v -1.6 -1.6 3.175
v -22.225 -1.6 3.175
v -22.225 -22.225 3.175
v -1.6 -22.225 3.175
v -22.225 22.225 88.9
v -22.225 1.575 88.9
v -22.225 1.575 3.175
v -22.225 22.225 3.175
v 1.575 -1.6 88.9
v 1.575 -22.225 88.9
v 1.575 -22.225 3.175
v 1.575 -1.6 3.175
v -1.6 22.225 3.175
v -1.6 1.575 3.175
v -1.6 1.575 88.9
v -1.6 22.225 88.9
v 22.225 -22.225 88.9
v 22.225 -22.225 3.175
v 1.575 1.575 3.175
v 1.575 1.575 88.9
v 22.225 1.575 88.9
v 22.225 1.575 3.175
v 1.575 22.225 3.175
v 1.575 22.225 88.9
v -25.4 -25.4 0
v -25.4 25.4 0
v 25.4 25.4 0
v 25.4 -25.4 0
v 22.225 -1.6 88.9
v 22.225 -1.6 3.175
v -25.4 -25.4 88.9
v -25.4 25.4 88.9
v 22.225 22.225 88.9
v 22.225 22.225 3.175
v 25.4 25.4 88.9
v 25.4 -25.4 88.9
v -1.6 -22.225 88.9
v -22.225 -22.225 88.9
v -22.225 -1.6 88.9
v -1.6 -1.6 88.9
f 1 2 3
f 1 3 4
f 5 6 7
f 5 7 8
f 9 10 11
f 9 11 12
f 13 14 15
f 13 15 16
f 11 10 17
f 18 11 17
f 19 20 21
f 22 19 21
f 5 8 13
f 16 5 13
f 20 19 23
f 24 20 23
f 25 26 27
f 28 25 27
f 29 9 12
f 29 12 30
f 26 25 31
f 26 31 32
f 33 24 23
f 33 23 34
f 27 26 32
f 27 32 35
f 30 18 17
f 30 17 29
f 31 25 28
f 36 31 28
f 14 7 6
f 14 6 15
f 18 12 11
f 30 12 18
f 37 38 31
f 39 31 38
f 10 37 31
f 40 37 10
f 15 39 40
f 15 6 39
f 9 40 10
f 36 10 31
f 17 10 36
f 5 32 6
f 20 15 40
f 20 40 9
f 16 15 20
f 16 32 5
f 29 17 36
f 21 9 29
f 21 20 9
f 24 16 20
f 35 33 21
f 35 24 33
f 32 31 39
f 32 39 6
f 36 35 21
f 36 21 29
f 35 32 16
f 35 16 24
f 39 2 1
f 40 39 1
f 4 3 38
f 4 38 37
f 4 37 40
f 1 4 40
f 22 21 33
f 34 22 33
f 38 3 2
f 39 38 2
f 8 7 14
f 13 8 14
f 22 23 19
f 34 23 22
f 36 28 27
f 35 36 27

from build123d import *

# Parameters (mm, degrees)
F0_W     = 50.8
F0_H     = 50.8
F1_DEPTH = 88.9
F2_T     = -3.175
F3_W     = 3.175
F3_H     = 44.45
F4_DEPTH = 85.725
F5_W     = 44.45
F5_H     = 3.175
F6_DEPTH = 85.725


with BuildPart() as f1:
    # F0 (on Top) → F1 (new body)
    with BuildSketch(Plane.XY):
        Rectangle(F0_W, F0_H)
    extrude(amount=F1_DEPTH)

    # F2
    f2_openings = [f1.faces().sort_by_distance(p)[0] for p in [
        (0, 0, 88.9),
    ]]
    offset(amount=F2_T, openings=f2_openings)



with BuildPart() as f4:
    # F3 (on face) → F4 (new body)
    with BuildSketch(Plane.XY.offset(88.9)):
        with Locations((-0.0127, 0)):
            Rectangle(F3_W, F3_H)
    extrude(amount=-F4_DEPTH)


with BuildPart() as f1_1:
    add(f1.part)

    add(f4.part)  # F6 merges F4
    # F5 (on face) → F6 (join)
    with BuildSketch(Plane.XY.offset(3.175)):
        with Locations((0, -0.0127)):
            Rectangle(F5_W, F5_H)
    extrude(amount=F6_DEPTH)


solid = f1_1.part
